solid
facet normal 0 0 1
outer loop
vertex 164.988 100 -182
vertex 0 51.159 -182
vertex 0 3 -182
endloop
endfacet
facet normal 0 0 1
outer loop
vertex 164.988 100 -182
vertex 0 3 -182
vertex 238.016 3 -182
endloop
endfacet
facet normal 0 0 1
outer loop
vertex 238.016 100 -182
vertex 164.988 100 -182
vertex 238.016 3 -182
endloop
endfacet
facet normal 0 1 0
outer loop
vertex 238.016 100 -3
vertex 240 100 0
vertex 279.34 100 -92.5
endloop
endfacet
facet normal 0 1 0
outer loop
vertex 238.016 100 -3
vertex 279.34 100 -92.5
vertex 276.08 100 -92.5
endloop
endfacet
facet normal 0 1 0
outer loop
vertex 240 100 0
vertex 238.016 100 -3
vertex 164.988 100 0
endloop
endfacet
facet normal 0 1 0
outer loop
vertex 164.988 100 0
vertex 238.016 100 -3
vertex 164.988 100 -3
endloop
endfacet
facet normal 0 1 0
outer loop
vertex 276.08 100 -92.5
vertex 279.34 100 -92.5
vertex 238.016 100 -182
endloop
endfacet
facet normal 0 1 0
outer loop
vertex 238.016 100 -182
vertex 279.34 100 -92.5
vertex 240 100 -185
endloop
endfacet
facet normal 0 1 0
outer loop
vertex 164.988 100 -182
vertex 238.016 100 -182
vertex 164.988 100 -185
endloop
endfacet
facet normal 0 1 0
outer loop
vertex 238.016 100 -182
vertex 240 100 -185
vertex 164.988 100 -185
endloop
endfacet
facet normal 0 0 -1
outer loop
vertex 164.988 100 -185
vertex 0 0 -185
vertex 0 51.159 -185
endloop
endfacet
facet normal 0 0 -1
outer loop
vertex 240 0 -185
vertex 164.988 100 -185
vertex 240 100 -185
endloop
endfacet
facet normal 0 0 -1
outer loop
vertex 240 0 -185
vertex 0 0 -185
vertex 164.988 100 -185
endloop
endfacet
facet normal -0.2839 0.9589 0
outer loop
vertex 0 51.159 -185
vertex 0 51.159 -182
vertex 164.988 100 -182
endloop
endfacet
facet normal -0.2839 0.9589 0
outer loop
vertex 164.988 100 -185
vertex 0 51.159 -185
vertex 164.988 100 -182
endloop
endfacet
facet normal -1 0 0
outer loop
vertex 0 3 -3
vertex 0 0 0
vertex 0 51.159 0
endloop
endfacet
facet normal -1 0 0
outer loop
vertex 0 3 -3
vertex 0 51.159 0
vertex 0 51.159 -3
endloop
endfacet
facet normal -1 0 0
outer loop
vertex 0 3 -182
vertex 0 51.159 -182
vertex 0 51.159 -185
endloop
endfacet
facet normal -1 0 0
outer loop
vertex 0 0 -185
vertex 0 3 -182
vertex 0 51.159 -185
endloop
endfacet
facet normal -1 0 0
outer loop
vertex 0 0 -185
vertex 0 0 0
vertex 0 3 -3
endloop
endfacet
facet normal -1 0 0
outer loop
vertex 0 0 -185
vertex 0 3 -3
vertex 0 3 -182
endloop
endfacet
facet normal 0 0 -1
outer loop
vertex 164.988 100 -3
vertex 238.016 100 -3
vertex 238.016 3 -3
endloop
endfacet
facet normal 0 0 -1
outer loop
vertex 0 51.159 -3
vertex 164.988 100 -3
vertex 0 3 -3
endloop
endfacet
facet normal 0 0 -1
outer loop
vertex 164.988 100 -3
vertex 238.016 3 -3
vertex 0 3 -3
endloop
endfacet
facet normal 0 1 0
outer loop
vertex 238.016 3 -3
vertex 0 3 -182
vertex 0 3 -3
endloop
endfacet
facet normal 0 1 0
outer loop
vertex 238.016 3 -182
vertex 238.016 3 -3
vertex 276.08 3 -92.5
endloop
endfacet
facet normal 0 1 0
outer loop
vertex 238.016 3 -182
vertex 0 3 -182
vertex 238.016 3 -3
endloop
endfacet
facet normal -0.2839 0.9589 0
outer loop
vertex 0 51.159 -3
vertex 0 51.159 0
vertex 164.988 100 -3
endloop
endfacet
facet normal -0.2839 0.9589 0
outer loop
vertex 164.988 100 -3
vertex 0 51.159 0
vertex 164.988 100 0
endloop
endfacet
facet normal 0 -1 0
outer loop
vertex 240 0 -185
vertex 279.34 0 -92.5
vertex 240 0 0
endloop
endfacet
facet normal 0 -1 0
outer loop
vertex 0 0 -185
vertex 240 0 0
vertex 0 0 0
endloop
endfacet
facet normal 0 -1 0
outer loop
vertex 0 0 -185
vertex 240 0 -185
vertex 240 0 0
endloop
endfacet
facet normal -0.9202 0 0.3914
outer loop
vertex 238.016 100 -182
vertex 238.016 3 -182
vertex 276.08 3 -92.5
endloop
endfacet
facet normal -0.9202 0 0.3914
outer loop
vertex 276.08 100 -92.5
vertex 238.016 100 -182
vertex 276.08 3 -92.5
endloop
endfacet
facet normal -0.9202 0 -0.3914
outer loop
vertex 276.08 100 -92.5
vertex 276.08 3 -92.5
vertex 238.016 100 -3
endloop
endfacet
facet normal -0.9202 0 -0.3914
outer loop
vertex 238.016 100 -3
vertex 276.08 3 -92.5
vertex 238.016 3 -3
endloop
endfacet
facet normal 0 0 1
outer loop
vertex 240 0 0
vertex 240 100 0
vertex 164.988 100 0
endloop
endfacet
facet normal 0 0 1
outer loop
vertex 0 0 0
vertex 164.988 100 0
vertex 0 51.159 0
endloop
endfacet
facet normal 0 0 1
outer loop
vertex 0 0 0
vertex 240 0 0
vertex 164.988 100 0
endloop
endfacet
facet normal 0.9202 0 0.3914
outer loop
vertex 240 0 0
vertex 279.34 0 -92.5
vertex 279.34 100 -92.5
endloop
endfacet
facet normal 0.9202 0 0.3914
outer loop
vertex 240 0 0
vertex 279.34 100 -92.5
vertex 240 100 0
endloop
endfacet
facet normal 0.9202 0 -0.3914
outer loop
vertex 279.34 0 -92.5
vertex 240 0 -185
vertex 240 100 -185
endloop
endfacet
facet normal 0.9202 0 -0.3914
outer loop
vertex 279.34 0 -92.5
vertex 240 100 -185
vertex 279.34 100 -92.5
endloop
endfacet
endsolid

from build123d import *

# Parameters (mm, degrees)
BOSS_EXTRUDE1_DEPTH = 100
SHELL1_T            = -3
SKETCH2_W           = 3
SKETCH2_H           = 179
CUT_EXTRUDE1_DEPTH  = 97
CUT_EXTRUDE2_DEPTH  = 350.650985941


with BuildPart() as part:
    # Sketch1 → Boss-Extrude1 (new body)
    with BuildSketch(Plane(origin=(0, 0, 0), x_dir=(1, 0, 0), z_dir=(0, 1, 0))):
        Polygon((240, 185), (279.339957703, 92.5), (240, 0), (0, 0), (0, 185), align=None)
    extrude(amount=BOSS_EXTRUDE1_DEPTH)

    # Shell1
    shell1_openings = [part.faces().sort_by_distance(p)[0] for p in [
        (130.08332263, 100, -92.5),
    ]]
    offset(amount=SHELL1_T, openings=shell1_openings, kind=Kind.INTERSECTION)

    # Sketch2 → Cut-Extrude1 (cut)
    with BuildSketch(Plane(origin=(0, 100, 0), x_dir=(1, 0, 0), z_dir=(0, 1, 0))):
        with Locations((1.5, 92.5)):
            Rectangle(SKETCH2_W, SKETCH2_H)
    extrude(amount=-CUT_EXTRUDE1_DEPTH, mode=Mode.SUBTRACT)

    # Sketch3 → Cut-Extrude2 (cut, through all)
    with BuildSketch(Plane.XY):
        Polygon((0, 100), (0, 51.158972719), (164.988073302, 100), align=None)
    extrude(amount=-CUT_EXTRUDE2_DEPTH, mode=Mode.SUBTRACT)


solid = part.part
